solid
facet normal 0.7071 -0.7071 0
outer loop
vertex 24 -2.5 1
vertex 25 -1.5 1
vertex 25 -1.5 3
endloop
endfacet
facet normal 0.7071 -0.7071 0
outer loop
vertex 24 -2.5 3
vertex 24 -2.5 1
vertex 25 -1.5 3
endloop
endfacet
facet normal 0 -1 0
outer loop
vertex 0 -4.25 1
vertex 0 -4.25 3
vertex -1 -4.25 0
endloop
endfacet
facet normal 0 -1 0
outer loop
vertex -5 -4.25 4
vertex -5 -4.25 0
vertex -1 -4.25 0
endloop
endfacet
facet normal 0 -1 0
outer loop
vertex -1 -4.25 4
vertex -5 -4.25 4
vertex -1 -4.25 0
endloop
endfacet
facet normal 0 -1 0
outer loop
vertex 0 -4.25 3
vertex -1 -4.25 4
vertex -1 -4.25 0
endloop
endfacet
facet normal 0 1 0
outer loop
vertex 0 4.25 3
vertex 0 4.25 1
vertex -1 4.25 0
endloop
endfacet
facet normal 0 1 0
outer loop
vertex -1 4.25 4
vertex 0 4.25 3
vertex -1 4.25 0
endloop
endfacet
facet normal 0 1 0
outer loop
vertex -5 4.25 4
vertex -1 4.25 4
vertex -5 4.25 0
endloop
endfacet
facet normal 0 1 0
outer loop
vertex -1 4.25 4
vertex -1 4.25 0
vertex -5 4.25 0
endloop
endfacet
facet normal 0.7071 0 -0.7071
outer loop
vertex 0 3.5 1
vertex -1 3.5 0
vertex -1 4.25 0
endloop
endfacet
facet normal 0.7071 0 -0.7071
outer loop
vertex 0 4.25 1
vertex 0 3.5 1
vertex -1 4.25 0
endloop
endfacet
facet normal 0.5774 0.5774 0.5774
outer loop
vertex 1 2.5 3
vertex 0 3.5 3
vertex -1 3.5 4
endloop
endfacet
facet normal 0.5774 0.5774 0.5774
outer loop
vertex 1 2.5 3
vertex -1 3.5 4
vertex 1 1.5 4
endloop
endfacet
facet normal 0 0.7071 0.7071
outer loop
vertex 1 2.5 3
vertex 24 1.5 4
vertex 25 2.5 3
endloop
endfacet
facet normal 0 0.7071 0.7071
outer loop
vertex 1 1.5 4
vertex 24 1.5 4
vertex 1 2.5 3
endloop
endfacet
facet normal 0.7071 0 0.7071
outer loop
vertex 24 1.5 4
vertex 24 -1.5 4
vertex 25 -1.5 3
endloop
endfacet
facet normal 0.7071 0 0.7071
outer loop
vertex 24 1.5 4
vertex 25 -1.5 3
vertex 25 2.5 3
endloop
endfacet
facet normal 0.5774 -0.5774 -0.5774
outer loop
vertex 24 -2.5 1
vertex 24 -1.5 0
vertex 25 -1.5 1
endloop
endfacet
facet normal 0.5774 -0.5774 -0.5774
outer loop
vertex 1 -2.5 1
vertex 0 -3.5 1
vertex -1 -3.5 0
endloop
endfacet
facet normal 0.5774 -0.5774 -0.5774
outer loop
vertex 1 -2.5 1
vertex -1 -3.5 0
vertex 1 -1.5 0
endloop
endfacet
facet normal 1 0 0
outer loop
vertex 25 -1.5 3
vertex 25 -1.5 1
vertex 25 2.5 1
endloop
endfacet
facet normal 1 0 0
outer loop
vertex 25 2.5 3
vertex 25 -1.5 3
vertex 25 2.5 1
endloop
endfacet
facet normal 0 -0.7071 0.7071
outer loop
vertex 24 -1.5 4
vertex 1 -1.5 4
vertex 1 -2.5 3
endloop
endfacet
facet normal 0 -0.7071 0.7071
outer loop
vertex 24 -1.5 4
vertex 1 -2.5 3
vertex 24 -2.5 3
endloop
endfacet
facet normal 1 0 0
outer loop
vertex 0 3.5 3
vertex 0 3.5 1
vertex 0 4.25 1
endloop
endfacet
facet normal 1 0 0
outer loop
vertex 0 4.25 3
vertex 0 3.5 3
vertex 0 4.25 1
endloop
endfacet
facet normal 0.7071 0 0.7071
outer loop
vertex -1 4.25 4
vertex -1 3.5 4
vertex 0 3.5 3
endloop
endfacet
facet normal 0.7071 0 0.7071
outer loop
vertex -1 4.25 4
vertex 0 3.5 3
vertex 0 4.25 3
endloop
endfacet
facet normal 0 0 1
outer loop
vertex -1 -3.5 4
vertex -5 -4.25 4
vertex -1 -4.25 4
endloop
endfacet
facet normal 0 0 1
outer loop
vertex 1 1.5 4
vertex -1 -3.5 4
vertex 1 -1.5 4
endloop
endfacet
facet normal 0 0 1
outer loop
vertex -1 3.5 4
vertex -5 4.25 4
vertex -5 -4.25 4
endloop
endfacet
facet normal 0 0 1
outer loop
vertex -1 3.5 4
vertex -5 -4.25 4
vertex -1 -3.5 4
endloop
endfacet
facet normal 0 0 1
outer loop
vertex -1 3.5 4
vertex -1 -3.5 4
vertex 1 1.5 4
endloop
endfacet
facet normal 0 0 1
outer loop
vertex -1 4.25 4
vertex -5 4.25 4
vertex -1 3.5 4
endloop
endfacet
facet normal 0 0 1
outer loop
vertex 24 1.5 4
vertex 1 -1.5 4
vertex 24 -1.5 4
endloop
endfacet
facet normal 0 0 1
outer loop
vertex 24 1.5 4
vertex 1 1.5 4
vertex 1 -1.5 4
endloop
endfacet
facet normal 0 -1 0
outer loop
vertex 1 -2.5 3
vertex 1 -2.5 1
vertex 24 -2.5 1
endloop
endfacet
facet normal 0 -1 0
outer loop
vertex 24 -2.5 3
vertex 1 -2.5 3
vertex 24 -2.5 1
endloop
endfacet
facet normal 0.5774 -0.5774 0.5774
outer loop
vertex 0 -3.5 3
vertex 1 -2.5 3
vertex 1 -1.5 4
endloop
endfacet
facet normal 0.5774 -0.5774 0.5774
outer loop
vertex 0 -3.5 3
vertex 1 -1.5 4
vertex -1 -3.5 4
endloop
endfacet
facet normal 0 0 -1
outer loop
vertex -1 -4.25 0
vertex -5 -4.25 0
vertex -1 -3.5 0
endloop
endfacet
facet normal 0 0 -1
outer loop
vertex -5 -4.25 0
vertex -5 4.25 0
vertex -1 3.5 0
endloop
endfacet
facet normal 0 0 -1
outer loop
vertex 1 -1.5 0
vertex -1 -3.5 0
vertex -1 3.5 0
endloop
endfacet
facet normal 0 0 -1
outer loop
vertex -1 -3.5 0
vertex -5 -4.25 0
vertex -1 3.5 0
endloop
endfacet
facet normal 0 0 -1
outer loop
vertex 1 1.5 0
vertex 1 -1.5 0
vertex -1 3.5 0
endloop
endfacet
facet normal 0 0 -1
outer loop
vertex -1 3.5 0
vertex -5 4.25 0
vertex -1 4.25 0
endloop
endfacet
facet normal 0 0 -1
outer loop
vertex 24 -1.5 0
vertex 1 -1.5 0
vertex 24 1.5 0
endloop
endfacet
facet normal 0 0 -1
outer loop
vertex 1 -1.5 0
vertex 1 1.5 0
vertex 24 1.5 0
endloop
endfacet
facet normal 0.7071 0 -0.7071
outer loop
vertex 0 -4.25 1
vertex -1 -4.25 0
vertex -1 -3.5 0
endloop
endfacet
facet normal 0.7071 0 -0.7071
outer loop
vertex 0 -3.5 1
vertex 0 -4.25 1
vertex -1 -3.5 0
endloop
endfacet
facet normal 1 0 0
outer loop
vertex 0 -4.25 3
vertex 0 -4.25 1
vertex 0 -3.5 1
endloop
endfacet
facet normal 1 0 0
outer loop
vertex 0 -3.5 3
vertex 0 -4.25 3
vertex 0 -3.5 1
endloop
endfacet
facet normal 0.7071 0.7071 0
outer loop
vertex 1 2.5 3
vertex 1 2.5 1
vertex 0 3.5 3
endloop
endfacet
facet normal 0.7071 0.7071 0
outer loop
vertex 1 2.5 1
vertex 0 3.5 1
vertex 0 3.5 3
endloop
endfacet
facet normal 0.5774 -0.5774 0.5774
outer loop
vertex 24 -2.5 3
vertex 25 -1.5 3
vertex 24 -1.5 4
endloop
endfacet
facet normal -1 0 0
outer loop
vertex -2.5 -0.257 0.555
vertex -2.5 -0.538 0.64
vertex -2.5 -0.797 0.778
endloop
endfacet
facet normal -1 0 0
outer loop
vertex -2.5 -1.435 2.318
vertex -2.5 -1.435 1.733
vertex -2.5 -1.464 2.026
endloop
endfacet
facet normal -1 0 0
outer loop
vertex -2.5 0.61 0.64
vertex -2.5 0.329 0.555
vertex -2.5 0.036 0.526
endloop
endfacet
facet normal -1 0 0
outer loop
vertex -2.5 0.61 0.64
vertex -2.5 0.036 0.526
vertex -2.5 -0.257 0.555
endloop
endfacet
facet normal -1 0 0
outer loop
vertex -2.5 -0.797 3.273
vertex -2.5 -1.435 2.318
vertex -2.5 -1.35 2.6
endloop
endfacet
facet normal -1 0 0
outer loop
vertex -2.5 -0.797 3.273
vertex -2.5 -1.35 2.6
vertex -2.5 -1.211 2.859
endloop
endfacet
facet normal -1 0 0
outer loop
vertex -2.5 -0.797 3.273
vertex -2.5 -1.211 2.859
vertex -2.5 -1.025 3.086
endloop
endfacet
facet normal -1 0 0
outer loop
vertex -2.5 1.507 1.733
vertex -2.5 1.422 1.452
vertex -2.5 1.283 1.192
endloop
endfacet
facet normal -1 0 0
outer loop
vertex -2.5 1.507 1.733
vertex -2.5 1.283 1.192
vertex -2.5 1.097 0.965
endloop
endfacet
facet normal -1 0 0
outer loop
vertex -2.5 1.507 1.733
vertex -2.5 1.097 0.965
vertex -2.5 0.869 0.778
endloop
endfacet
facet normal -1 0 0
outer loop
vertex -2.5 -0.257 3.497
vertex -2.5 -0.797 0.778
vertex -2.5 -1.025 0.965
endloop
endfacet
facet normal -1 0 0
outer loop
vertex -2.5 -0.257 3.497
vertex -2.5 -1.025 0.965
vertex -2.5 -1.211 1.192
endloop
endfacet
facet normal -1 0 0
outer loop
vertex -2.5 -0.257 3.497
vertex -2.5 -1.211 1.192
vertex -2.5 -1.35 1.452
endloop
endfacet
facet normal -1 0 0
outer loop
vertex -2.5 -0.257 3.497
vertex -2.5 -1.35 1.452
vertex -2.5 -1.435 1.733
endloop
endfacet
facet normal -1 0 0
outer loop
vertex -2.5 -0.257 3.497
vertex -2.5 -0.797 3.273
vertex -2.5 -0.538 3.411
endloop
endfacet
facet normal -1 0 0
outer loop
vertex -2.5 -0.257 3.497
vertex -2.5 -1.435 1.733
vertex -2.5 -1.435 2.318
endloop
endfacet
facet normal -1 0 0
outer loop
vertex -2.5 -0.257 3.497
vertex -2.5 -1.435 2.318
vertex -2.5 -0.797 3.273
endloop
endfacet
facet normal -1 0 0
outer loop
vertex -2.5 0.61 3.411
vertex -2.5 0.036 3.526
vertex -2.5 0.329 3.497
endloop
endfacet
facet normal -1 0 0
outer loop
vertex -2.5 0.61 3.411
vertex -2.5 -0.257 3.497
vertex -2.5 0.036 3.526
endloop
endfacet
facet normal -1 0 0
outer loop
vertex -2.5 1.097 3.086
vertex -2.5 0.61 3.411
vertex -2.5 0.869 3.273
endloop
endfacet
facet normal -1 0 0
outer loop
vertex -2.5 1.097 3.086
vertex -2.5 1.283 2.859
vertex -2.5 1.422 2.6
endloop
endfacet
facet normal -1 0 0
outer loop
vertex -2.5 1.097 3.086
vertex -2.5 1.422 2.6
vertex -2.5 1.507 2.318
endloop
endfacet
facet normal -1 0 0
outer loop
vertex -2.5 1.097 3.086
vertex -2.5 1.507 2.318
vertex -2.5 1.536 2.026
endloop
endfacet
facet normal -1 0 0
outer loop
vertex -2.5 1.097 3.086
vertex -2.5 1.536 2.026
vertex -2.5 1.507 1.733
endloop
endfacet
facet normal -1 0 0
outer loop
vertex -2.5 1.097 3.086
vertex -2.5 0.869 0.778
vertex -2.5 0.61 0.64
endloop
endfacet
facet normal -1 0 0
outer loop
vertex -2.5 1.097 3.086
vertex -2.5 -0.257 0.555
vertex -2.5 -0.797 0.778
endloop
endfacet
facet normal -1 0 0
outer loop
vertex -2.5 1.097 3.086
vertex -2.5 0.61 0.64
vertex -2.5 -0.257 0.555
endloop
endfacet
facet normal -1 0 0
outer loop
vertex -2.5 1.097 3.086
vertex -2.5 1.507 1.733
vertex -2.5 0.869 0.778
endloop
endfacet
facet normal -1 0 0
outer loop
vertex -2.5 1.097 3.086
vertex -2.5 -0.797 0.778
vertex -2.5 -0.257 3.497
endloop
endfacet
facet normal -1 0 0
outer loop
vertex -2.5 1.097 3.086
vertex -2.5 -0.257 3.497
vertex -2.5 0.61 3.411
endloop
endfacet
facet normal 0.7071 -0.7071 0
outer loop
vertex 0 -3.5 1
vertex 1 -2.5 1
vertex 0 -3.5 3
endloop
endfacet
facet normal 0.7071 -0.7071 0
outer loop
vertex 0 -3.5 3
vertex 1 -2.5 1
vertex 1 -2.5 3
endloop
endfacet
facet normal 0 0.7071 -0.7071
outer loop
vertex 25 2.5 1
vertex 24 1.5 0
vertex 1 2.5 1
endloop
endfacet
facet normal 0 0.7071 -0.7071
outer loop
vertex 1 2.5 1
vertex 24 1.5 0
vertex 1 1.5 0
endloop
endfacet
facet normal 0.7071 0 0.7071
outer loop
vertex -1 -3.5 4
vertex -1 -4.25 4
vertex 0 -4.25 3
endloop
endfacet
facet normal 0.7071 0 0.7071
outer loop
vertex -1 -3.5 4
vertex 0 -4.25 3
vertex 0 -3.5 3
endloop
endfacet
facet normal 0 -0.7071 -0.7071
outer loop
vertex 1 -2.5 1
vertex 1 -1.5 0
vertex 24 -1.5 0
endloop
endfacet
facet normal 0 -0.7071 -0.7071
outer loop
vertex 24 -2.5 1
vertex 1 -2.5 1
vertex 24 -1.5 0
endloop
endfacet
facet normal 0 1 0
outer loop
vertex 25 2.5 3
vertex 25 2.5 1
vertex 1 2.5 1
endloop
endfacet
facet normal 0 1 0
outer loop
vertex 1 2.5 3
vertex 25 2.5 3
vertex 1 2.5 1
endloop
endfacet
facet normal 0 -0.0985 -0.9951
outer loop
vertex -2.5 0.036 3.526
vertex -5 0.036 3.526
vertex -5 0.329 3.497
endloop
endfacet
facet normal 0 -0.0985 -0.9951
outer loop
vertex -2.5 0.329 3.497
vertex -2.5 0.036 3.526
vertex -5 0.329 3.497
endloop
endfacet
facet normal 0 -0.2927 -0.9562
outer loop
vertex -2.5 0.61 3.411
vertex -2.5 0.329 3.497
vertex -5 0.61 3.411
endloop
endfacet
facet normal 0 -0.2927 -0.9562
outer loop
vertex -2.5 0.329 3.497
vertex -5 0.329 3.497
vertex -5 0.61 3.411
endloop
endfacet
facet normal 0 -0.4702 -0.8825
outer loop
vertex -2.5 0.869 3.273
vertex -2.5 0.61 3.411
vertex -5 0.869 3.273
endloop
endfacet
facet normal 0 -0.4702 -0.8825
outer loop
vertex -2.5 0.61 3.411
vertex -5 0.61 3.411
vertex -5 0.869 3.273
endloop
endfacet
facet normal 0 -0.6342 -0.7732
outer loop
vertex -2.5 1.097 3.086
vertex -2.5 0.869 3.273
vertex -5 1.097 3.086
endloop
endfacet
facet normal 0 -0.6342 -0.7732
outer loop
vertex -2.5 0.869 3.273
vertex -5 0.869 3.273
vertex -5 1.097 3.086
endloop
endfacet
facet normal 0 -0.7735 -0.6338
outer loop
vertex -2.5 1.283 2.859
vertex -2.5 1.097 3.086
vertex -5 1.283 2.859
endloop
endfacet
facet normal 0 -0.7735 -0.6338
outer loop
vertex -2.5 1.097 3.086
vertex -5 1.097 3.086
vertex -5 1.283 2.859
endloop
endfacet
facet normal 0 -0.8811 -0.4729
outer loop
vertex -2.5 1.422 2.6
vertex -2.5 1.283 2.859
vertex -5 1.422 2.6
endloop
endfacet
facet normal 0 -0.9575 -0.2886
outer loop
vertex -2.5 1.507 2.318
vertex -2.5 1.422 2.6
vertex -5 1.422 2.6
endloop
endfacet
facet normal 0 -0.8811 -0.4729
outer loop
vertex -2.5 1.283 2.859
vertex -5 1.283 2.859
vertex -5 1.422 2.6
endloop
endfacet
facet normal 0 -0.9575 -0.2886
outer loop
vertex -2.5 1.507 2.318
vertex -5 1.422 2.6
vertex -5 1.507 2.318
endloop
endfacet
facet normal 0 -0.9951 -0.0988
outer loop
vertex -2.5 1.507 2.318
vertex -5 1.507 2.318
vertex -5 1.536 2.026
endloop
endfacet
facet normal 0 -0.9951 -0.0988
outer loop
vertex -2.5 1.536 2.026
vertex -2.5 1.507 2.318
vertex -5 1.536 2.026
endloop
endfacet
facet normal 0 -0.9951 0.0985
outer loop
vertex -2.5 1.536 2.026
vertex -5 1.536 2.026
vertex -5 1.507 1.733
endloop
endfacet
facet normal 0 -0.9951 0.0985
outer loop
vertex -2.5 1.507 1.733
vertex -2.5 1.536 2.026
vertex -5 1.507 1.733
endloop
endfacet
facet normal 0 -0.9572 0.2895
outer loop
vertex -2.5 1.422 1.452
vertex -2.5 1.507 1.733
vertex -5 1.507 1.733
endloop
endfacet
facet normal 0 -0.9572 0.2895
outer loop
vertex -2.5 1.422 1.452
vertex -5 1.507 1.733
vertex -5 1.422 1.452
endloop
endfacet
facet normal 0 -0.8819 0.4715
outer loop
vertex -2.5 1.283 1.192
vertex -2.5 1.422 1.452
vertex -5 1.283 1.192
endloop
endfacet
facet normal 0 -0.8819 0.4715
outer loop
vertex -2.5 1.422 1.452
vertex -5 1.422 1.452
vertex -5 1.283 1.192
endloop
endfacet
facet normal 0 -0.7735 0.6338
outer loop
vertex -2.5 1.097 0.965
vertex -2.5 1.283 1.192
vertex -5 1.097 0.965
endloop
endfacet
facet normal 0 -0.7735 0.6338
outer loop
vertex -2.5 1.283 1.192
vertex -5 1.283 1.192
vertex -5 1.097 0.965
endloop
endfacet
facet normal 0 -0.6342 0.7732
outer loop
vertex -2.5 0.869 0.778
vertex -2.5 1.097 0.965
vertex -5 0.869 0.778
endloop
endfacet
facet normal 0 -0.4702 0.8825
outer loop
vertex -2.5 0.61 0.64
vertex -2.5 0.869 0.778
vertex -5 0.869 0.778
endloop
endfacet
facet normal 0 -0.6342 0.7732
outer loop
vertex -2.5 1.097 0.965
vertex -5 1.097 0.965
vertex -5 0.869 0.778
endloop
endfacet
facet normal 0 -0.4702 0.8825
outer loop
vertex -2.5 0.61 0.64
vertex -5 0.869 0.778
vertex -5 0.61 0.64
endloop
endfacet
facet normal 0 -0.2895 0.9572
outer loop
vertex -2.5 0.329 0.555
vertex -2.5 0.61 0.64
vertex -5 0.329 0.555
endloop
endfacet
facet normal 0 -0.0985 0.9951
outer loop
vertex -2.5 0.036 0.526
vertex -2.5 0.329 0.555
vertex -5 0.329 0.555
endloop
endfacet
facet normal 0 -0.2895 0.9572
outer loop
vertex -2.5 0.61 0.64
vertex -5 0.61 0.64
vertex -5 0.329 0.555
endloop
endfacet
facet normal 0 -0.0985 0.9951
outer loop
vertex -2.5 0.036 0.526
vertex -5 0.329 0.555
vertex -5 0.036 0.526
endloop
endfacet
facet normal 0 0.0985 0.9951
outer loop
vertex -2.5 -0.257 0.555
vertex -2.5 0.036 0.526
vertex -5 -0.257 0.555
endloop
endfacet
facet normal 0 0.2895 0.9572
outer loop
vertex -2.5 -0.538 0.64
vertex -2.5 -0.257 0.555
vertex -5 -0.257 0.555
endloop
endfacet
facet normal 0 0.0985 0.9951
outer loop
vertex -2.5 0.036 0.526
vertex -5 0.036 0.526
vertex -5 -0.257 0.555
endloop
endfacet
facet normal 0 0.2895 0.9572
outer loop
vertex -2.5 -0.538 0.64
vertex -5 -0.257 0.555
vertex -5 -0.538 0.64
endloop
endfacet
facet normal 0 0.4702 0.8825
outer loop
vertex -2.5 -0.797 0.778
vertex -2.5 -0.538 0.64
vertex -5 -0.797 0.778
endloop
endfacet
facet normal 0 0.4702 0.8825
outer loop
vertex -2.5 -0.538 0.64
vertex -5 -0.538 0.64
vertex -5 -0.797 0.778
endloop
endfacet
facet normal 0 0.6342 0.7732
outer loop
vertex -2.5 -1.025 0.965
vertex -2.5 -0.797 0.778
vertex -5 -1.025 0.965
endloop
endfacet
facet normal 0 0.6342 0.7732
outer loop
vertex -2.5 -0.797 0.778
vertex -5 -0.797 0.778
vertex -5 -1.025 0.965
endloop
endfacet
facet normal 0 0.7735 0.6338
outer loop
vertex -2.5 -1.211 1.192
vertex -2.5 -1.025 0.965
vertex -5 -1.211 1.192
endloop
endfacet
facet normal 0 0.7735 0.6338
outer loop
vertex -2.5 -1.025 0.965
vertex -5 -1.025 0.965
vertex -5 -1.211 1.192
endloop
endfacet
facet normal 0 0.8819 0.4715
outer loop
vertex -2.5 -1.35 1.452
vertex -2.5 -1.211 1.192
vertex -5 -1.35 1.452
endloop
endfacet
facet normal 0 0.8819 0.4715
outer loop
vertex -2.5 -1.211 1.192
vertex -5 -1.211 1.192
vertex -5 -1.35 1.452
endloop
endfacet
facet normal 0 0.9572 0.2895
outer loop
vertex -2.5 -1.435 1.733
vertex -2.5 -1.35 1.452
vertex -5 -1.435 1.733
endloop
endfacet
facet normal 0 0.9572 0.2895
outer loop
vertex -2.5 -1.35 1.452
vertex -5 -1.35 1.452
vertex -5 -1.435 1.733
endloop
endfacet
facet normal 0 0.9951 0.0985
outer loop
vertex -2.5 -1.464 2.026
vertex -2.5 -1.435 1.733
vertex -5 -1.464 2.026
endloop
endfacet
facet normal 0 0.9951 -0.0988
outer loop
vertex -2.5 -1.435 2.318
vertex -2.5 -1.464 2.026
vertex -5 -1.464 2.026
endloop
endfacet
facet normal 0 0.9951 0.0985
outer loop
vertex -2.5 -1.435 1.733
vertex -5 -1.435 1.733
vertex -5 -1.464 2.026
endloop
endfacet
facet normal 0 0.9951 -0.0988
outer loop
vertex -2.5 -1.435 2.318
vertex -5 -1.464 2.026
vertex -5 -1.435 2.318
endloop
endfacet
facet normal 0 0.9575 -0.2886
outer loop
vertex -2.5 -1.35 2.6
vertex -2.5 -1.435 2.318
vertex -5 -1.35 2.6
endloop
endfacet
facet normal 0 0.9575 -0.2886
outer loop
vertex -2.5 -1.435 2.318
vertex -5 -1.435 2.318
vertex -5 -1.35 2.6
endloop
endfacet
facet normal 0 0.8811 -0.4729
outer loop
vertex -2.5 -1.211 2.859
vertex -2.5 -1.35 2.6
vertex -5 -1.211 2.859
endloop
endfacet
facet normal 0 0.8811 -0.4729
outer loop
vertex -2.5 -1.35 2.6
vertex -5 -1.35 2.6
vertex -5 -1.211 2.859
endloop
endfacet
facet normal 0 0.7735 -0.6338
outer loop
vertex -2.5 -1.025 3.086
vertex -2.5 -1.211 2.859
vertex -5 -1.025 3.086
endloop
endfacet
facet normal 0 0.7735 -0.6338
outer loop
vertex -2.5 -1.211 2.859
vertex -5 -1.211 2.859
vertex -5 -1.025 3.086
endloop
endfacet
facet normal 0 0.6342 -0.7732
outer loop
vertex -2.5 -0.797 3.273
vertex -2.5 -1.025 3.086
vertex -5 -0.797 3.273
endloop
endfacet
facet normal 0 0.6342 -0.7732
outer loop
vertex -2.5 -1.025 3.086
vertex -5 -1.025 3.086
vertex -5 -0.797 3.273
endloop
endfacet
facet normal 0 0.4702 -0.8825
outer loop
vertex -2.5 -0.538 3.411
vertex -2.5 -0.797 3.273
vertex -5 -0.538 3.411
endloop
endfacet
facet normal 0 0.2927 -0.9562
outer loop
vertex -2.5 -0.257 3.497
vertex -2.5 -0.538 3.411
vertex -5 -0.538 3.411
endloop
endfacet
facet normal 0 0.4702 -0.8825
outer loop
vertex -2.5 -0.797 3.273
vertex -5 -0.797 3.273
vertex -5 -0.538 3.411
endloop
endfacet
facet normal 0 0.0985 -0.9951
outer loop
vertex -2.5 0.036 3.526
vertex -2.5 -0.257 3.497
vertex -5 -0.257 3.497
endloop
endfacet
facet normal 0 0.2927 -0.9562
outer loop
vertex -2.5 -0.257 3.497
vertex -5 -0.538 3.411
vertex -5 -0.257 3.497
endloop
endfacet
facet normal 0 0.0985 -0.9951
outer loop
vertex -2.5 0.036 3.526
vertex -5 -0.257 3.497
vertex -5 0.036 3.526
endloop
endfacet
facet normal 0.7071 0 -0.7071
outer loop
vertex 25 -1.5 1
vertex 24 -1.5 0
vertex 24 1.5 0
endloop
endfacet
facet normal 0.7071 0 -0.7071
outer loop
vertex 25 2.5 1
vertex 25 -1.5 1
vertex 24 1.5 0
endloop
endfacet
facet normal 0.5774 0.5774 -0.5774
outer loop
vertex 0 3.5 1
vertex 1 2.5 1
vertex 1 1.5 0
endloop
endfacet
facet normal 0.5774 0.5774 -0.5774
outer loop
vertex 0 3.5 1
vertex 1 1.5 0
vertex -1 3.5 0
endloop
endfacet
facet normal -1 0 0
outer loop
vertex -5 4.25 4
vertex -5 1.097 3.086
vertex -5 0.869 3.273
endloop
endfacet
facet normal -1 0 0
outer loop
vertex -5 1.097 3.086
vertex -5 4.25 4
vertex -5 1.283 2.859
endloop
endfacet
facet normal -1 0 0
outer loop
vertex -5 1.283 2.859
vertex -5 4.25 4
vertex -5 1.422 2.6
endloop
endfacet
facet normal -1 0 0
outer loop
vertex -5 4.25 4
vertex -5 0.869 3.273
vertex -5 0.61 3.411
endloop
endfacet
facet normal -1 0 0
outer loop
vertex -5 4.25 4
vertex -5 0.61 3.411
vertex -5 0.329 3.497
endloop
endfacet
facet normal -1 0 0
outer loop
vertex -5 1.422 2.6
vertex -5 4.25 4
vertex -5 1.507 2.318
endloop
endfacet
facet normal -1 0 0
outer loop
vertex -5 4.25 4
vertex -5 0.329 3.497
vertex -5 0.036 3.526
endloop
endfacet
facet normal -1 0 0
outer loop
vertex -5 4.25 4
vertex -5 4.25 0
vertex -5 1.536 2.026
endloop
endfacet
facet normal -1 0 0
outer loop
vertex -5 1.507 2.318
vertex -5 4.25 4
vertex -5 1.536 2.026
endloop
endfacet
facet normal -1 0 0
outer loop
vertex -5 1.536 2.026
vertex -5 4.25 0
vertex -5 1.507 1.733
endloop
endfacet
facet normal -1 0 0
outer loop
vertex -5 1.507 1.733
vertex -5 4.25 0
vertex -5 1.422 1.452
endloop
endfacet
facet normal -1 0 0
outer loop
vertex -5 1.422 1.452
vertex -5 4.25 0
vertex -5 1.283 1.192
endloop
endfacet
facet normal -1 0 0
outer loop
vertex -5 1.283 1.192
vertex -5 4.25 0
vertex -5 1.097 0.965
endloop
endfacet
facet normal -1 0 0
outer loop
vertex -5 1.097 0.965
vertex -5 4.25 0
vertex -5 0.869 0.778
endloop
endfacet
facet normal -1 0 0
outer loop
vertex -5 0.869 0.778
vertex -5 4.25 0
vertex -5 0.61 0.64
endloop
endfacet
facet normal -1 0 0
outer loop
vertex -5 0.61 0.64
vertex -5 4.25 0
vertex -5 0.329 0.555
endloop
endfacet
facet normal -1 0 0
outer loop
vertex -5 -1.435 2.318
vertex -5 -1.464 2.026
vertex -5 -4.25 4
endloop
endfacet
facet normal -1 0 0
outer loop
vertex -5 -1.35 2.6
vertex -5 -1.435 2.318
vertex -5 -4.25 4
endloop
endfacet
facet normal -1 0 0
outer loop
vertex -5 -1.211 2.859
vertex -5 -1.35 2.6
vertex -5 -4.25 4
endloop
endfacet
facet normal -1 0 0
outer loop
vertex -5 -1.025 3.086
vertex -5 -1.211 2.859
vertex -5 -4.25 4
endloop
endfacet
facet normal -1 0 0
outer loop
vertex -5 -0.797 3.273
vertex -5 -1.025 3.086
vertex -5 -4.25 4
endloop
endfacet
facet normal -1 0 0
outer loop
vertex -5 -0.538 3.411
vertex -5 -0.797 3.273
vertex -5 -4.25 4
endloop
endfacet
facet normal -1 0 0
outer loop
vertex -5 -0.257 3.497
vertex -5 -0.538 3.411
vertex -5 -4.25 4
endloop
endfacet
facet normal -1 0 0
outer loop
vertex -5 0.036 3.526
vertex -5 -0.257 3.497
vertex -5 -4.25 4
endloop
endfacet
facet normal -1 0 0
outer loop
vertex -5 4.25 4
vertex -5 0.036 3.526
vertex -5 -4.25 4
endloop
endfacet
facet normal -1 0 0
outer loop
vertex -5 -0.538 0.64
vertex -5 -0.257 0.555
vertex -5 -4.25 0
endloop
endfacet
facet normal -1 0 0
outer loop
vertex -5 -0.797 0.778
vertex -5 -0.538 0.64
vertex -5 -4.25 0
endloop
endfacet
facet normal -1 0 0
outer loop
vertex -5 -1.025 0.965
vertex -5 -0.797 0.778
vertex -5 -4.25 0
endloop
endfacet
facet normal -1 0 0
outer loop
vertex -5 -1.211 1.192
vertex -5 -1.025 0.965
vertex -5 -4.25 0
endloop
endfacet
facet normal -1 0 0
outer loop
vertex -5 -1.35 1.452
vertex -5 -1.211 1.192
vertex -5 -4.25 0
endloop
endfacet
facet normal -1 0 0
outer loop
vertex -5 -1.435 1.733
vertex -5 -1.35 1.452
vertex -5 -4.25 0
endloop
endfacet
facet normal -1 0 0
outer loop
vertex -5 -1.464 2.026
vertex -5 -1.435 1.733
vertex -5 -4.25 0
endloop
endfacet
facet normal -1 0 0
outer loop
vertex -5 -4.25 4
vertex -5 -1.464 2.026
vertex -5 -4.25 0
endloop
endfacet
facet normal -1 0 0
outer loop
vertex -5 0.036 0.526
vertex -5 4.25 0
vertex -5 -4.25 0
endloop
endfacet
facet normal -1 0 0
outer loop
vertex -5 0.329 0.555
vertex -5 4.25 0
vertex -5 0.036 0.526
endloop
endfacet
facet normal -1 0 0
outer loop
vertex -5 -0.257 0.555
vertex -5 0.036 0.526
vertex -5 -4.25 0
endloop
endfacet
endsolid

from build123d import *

# Parameters (mm, degrees)
BASE_DEPTH         = 4
CHAMFER1_SIZE      = 1
SKETCH2_R          = 1.5
CUT_EXTRUDE1_DEPTH = 2.5


with BuildPart() as part:
    # Sketch1 → BASE (new body)
    with BuildSketch(Plane.XY):
        Polygon((0, -4.25), (0, -2.5), (25, -2.5), (25, 2.5), (0, 2.5), (0, 4.25), (-5, 4.25), (-5, -4.25), align=None)
    extrude(amount=BASE_DEPTH)

    # Chamfer1
    chamfer1_edges = [part.edges().sort_by_distance(p)[0] for p in [
        (0, -3.375, 0),
        (12.5, -2.5, 0),
        (25, 0, 0),
        (0, -3.375, 4),
        (0, 2.5, 2),
        (0, -2.5, 2),
        (25, -2.5, 2),
        (0, 3.375, 4),
        (12.5, 2.5, 4),
        (25, 0, 4),
        (12.5, 2.5, 0),
        (12.5, -2.5, 4),
        (0, 3.375, 0),
    ]]
    chamfer(chamfer1_edges, length=CHAMFER1_SIZE)

    # Sketch2 → Cut-Extrude1 (cut)
    with BuildSketch(Plane.ZY.offset(5)):
        with Locations((2.025680481, 0.035876769)):
            Circle(SKETCH2_R)
    extrude(amount=-CUT_EXTRUDE1_DEPTH, mode=Mode.SUBTRACT)


solid = part.part
